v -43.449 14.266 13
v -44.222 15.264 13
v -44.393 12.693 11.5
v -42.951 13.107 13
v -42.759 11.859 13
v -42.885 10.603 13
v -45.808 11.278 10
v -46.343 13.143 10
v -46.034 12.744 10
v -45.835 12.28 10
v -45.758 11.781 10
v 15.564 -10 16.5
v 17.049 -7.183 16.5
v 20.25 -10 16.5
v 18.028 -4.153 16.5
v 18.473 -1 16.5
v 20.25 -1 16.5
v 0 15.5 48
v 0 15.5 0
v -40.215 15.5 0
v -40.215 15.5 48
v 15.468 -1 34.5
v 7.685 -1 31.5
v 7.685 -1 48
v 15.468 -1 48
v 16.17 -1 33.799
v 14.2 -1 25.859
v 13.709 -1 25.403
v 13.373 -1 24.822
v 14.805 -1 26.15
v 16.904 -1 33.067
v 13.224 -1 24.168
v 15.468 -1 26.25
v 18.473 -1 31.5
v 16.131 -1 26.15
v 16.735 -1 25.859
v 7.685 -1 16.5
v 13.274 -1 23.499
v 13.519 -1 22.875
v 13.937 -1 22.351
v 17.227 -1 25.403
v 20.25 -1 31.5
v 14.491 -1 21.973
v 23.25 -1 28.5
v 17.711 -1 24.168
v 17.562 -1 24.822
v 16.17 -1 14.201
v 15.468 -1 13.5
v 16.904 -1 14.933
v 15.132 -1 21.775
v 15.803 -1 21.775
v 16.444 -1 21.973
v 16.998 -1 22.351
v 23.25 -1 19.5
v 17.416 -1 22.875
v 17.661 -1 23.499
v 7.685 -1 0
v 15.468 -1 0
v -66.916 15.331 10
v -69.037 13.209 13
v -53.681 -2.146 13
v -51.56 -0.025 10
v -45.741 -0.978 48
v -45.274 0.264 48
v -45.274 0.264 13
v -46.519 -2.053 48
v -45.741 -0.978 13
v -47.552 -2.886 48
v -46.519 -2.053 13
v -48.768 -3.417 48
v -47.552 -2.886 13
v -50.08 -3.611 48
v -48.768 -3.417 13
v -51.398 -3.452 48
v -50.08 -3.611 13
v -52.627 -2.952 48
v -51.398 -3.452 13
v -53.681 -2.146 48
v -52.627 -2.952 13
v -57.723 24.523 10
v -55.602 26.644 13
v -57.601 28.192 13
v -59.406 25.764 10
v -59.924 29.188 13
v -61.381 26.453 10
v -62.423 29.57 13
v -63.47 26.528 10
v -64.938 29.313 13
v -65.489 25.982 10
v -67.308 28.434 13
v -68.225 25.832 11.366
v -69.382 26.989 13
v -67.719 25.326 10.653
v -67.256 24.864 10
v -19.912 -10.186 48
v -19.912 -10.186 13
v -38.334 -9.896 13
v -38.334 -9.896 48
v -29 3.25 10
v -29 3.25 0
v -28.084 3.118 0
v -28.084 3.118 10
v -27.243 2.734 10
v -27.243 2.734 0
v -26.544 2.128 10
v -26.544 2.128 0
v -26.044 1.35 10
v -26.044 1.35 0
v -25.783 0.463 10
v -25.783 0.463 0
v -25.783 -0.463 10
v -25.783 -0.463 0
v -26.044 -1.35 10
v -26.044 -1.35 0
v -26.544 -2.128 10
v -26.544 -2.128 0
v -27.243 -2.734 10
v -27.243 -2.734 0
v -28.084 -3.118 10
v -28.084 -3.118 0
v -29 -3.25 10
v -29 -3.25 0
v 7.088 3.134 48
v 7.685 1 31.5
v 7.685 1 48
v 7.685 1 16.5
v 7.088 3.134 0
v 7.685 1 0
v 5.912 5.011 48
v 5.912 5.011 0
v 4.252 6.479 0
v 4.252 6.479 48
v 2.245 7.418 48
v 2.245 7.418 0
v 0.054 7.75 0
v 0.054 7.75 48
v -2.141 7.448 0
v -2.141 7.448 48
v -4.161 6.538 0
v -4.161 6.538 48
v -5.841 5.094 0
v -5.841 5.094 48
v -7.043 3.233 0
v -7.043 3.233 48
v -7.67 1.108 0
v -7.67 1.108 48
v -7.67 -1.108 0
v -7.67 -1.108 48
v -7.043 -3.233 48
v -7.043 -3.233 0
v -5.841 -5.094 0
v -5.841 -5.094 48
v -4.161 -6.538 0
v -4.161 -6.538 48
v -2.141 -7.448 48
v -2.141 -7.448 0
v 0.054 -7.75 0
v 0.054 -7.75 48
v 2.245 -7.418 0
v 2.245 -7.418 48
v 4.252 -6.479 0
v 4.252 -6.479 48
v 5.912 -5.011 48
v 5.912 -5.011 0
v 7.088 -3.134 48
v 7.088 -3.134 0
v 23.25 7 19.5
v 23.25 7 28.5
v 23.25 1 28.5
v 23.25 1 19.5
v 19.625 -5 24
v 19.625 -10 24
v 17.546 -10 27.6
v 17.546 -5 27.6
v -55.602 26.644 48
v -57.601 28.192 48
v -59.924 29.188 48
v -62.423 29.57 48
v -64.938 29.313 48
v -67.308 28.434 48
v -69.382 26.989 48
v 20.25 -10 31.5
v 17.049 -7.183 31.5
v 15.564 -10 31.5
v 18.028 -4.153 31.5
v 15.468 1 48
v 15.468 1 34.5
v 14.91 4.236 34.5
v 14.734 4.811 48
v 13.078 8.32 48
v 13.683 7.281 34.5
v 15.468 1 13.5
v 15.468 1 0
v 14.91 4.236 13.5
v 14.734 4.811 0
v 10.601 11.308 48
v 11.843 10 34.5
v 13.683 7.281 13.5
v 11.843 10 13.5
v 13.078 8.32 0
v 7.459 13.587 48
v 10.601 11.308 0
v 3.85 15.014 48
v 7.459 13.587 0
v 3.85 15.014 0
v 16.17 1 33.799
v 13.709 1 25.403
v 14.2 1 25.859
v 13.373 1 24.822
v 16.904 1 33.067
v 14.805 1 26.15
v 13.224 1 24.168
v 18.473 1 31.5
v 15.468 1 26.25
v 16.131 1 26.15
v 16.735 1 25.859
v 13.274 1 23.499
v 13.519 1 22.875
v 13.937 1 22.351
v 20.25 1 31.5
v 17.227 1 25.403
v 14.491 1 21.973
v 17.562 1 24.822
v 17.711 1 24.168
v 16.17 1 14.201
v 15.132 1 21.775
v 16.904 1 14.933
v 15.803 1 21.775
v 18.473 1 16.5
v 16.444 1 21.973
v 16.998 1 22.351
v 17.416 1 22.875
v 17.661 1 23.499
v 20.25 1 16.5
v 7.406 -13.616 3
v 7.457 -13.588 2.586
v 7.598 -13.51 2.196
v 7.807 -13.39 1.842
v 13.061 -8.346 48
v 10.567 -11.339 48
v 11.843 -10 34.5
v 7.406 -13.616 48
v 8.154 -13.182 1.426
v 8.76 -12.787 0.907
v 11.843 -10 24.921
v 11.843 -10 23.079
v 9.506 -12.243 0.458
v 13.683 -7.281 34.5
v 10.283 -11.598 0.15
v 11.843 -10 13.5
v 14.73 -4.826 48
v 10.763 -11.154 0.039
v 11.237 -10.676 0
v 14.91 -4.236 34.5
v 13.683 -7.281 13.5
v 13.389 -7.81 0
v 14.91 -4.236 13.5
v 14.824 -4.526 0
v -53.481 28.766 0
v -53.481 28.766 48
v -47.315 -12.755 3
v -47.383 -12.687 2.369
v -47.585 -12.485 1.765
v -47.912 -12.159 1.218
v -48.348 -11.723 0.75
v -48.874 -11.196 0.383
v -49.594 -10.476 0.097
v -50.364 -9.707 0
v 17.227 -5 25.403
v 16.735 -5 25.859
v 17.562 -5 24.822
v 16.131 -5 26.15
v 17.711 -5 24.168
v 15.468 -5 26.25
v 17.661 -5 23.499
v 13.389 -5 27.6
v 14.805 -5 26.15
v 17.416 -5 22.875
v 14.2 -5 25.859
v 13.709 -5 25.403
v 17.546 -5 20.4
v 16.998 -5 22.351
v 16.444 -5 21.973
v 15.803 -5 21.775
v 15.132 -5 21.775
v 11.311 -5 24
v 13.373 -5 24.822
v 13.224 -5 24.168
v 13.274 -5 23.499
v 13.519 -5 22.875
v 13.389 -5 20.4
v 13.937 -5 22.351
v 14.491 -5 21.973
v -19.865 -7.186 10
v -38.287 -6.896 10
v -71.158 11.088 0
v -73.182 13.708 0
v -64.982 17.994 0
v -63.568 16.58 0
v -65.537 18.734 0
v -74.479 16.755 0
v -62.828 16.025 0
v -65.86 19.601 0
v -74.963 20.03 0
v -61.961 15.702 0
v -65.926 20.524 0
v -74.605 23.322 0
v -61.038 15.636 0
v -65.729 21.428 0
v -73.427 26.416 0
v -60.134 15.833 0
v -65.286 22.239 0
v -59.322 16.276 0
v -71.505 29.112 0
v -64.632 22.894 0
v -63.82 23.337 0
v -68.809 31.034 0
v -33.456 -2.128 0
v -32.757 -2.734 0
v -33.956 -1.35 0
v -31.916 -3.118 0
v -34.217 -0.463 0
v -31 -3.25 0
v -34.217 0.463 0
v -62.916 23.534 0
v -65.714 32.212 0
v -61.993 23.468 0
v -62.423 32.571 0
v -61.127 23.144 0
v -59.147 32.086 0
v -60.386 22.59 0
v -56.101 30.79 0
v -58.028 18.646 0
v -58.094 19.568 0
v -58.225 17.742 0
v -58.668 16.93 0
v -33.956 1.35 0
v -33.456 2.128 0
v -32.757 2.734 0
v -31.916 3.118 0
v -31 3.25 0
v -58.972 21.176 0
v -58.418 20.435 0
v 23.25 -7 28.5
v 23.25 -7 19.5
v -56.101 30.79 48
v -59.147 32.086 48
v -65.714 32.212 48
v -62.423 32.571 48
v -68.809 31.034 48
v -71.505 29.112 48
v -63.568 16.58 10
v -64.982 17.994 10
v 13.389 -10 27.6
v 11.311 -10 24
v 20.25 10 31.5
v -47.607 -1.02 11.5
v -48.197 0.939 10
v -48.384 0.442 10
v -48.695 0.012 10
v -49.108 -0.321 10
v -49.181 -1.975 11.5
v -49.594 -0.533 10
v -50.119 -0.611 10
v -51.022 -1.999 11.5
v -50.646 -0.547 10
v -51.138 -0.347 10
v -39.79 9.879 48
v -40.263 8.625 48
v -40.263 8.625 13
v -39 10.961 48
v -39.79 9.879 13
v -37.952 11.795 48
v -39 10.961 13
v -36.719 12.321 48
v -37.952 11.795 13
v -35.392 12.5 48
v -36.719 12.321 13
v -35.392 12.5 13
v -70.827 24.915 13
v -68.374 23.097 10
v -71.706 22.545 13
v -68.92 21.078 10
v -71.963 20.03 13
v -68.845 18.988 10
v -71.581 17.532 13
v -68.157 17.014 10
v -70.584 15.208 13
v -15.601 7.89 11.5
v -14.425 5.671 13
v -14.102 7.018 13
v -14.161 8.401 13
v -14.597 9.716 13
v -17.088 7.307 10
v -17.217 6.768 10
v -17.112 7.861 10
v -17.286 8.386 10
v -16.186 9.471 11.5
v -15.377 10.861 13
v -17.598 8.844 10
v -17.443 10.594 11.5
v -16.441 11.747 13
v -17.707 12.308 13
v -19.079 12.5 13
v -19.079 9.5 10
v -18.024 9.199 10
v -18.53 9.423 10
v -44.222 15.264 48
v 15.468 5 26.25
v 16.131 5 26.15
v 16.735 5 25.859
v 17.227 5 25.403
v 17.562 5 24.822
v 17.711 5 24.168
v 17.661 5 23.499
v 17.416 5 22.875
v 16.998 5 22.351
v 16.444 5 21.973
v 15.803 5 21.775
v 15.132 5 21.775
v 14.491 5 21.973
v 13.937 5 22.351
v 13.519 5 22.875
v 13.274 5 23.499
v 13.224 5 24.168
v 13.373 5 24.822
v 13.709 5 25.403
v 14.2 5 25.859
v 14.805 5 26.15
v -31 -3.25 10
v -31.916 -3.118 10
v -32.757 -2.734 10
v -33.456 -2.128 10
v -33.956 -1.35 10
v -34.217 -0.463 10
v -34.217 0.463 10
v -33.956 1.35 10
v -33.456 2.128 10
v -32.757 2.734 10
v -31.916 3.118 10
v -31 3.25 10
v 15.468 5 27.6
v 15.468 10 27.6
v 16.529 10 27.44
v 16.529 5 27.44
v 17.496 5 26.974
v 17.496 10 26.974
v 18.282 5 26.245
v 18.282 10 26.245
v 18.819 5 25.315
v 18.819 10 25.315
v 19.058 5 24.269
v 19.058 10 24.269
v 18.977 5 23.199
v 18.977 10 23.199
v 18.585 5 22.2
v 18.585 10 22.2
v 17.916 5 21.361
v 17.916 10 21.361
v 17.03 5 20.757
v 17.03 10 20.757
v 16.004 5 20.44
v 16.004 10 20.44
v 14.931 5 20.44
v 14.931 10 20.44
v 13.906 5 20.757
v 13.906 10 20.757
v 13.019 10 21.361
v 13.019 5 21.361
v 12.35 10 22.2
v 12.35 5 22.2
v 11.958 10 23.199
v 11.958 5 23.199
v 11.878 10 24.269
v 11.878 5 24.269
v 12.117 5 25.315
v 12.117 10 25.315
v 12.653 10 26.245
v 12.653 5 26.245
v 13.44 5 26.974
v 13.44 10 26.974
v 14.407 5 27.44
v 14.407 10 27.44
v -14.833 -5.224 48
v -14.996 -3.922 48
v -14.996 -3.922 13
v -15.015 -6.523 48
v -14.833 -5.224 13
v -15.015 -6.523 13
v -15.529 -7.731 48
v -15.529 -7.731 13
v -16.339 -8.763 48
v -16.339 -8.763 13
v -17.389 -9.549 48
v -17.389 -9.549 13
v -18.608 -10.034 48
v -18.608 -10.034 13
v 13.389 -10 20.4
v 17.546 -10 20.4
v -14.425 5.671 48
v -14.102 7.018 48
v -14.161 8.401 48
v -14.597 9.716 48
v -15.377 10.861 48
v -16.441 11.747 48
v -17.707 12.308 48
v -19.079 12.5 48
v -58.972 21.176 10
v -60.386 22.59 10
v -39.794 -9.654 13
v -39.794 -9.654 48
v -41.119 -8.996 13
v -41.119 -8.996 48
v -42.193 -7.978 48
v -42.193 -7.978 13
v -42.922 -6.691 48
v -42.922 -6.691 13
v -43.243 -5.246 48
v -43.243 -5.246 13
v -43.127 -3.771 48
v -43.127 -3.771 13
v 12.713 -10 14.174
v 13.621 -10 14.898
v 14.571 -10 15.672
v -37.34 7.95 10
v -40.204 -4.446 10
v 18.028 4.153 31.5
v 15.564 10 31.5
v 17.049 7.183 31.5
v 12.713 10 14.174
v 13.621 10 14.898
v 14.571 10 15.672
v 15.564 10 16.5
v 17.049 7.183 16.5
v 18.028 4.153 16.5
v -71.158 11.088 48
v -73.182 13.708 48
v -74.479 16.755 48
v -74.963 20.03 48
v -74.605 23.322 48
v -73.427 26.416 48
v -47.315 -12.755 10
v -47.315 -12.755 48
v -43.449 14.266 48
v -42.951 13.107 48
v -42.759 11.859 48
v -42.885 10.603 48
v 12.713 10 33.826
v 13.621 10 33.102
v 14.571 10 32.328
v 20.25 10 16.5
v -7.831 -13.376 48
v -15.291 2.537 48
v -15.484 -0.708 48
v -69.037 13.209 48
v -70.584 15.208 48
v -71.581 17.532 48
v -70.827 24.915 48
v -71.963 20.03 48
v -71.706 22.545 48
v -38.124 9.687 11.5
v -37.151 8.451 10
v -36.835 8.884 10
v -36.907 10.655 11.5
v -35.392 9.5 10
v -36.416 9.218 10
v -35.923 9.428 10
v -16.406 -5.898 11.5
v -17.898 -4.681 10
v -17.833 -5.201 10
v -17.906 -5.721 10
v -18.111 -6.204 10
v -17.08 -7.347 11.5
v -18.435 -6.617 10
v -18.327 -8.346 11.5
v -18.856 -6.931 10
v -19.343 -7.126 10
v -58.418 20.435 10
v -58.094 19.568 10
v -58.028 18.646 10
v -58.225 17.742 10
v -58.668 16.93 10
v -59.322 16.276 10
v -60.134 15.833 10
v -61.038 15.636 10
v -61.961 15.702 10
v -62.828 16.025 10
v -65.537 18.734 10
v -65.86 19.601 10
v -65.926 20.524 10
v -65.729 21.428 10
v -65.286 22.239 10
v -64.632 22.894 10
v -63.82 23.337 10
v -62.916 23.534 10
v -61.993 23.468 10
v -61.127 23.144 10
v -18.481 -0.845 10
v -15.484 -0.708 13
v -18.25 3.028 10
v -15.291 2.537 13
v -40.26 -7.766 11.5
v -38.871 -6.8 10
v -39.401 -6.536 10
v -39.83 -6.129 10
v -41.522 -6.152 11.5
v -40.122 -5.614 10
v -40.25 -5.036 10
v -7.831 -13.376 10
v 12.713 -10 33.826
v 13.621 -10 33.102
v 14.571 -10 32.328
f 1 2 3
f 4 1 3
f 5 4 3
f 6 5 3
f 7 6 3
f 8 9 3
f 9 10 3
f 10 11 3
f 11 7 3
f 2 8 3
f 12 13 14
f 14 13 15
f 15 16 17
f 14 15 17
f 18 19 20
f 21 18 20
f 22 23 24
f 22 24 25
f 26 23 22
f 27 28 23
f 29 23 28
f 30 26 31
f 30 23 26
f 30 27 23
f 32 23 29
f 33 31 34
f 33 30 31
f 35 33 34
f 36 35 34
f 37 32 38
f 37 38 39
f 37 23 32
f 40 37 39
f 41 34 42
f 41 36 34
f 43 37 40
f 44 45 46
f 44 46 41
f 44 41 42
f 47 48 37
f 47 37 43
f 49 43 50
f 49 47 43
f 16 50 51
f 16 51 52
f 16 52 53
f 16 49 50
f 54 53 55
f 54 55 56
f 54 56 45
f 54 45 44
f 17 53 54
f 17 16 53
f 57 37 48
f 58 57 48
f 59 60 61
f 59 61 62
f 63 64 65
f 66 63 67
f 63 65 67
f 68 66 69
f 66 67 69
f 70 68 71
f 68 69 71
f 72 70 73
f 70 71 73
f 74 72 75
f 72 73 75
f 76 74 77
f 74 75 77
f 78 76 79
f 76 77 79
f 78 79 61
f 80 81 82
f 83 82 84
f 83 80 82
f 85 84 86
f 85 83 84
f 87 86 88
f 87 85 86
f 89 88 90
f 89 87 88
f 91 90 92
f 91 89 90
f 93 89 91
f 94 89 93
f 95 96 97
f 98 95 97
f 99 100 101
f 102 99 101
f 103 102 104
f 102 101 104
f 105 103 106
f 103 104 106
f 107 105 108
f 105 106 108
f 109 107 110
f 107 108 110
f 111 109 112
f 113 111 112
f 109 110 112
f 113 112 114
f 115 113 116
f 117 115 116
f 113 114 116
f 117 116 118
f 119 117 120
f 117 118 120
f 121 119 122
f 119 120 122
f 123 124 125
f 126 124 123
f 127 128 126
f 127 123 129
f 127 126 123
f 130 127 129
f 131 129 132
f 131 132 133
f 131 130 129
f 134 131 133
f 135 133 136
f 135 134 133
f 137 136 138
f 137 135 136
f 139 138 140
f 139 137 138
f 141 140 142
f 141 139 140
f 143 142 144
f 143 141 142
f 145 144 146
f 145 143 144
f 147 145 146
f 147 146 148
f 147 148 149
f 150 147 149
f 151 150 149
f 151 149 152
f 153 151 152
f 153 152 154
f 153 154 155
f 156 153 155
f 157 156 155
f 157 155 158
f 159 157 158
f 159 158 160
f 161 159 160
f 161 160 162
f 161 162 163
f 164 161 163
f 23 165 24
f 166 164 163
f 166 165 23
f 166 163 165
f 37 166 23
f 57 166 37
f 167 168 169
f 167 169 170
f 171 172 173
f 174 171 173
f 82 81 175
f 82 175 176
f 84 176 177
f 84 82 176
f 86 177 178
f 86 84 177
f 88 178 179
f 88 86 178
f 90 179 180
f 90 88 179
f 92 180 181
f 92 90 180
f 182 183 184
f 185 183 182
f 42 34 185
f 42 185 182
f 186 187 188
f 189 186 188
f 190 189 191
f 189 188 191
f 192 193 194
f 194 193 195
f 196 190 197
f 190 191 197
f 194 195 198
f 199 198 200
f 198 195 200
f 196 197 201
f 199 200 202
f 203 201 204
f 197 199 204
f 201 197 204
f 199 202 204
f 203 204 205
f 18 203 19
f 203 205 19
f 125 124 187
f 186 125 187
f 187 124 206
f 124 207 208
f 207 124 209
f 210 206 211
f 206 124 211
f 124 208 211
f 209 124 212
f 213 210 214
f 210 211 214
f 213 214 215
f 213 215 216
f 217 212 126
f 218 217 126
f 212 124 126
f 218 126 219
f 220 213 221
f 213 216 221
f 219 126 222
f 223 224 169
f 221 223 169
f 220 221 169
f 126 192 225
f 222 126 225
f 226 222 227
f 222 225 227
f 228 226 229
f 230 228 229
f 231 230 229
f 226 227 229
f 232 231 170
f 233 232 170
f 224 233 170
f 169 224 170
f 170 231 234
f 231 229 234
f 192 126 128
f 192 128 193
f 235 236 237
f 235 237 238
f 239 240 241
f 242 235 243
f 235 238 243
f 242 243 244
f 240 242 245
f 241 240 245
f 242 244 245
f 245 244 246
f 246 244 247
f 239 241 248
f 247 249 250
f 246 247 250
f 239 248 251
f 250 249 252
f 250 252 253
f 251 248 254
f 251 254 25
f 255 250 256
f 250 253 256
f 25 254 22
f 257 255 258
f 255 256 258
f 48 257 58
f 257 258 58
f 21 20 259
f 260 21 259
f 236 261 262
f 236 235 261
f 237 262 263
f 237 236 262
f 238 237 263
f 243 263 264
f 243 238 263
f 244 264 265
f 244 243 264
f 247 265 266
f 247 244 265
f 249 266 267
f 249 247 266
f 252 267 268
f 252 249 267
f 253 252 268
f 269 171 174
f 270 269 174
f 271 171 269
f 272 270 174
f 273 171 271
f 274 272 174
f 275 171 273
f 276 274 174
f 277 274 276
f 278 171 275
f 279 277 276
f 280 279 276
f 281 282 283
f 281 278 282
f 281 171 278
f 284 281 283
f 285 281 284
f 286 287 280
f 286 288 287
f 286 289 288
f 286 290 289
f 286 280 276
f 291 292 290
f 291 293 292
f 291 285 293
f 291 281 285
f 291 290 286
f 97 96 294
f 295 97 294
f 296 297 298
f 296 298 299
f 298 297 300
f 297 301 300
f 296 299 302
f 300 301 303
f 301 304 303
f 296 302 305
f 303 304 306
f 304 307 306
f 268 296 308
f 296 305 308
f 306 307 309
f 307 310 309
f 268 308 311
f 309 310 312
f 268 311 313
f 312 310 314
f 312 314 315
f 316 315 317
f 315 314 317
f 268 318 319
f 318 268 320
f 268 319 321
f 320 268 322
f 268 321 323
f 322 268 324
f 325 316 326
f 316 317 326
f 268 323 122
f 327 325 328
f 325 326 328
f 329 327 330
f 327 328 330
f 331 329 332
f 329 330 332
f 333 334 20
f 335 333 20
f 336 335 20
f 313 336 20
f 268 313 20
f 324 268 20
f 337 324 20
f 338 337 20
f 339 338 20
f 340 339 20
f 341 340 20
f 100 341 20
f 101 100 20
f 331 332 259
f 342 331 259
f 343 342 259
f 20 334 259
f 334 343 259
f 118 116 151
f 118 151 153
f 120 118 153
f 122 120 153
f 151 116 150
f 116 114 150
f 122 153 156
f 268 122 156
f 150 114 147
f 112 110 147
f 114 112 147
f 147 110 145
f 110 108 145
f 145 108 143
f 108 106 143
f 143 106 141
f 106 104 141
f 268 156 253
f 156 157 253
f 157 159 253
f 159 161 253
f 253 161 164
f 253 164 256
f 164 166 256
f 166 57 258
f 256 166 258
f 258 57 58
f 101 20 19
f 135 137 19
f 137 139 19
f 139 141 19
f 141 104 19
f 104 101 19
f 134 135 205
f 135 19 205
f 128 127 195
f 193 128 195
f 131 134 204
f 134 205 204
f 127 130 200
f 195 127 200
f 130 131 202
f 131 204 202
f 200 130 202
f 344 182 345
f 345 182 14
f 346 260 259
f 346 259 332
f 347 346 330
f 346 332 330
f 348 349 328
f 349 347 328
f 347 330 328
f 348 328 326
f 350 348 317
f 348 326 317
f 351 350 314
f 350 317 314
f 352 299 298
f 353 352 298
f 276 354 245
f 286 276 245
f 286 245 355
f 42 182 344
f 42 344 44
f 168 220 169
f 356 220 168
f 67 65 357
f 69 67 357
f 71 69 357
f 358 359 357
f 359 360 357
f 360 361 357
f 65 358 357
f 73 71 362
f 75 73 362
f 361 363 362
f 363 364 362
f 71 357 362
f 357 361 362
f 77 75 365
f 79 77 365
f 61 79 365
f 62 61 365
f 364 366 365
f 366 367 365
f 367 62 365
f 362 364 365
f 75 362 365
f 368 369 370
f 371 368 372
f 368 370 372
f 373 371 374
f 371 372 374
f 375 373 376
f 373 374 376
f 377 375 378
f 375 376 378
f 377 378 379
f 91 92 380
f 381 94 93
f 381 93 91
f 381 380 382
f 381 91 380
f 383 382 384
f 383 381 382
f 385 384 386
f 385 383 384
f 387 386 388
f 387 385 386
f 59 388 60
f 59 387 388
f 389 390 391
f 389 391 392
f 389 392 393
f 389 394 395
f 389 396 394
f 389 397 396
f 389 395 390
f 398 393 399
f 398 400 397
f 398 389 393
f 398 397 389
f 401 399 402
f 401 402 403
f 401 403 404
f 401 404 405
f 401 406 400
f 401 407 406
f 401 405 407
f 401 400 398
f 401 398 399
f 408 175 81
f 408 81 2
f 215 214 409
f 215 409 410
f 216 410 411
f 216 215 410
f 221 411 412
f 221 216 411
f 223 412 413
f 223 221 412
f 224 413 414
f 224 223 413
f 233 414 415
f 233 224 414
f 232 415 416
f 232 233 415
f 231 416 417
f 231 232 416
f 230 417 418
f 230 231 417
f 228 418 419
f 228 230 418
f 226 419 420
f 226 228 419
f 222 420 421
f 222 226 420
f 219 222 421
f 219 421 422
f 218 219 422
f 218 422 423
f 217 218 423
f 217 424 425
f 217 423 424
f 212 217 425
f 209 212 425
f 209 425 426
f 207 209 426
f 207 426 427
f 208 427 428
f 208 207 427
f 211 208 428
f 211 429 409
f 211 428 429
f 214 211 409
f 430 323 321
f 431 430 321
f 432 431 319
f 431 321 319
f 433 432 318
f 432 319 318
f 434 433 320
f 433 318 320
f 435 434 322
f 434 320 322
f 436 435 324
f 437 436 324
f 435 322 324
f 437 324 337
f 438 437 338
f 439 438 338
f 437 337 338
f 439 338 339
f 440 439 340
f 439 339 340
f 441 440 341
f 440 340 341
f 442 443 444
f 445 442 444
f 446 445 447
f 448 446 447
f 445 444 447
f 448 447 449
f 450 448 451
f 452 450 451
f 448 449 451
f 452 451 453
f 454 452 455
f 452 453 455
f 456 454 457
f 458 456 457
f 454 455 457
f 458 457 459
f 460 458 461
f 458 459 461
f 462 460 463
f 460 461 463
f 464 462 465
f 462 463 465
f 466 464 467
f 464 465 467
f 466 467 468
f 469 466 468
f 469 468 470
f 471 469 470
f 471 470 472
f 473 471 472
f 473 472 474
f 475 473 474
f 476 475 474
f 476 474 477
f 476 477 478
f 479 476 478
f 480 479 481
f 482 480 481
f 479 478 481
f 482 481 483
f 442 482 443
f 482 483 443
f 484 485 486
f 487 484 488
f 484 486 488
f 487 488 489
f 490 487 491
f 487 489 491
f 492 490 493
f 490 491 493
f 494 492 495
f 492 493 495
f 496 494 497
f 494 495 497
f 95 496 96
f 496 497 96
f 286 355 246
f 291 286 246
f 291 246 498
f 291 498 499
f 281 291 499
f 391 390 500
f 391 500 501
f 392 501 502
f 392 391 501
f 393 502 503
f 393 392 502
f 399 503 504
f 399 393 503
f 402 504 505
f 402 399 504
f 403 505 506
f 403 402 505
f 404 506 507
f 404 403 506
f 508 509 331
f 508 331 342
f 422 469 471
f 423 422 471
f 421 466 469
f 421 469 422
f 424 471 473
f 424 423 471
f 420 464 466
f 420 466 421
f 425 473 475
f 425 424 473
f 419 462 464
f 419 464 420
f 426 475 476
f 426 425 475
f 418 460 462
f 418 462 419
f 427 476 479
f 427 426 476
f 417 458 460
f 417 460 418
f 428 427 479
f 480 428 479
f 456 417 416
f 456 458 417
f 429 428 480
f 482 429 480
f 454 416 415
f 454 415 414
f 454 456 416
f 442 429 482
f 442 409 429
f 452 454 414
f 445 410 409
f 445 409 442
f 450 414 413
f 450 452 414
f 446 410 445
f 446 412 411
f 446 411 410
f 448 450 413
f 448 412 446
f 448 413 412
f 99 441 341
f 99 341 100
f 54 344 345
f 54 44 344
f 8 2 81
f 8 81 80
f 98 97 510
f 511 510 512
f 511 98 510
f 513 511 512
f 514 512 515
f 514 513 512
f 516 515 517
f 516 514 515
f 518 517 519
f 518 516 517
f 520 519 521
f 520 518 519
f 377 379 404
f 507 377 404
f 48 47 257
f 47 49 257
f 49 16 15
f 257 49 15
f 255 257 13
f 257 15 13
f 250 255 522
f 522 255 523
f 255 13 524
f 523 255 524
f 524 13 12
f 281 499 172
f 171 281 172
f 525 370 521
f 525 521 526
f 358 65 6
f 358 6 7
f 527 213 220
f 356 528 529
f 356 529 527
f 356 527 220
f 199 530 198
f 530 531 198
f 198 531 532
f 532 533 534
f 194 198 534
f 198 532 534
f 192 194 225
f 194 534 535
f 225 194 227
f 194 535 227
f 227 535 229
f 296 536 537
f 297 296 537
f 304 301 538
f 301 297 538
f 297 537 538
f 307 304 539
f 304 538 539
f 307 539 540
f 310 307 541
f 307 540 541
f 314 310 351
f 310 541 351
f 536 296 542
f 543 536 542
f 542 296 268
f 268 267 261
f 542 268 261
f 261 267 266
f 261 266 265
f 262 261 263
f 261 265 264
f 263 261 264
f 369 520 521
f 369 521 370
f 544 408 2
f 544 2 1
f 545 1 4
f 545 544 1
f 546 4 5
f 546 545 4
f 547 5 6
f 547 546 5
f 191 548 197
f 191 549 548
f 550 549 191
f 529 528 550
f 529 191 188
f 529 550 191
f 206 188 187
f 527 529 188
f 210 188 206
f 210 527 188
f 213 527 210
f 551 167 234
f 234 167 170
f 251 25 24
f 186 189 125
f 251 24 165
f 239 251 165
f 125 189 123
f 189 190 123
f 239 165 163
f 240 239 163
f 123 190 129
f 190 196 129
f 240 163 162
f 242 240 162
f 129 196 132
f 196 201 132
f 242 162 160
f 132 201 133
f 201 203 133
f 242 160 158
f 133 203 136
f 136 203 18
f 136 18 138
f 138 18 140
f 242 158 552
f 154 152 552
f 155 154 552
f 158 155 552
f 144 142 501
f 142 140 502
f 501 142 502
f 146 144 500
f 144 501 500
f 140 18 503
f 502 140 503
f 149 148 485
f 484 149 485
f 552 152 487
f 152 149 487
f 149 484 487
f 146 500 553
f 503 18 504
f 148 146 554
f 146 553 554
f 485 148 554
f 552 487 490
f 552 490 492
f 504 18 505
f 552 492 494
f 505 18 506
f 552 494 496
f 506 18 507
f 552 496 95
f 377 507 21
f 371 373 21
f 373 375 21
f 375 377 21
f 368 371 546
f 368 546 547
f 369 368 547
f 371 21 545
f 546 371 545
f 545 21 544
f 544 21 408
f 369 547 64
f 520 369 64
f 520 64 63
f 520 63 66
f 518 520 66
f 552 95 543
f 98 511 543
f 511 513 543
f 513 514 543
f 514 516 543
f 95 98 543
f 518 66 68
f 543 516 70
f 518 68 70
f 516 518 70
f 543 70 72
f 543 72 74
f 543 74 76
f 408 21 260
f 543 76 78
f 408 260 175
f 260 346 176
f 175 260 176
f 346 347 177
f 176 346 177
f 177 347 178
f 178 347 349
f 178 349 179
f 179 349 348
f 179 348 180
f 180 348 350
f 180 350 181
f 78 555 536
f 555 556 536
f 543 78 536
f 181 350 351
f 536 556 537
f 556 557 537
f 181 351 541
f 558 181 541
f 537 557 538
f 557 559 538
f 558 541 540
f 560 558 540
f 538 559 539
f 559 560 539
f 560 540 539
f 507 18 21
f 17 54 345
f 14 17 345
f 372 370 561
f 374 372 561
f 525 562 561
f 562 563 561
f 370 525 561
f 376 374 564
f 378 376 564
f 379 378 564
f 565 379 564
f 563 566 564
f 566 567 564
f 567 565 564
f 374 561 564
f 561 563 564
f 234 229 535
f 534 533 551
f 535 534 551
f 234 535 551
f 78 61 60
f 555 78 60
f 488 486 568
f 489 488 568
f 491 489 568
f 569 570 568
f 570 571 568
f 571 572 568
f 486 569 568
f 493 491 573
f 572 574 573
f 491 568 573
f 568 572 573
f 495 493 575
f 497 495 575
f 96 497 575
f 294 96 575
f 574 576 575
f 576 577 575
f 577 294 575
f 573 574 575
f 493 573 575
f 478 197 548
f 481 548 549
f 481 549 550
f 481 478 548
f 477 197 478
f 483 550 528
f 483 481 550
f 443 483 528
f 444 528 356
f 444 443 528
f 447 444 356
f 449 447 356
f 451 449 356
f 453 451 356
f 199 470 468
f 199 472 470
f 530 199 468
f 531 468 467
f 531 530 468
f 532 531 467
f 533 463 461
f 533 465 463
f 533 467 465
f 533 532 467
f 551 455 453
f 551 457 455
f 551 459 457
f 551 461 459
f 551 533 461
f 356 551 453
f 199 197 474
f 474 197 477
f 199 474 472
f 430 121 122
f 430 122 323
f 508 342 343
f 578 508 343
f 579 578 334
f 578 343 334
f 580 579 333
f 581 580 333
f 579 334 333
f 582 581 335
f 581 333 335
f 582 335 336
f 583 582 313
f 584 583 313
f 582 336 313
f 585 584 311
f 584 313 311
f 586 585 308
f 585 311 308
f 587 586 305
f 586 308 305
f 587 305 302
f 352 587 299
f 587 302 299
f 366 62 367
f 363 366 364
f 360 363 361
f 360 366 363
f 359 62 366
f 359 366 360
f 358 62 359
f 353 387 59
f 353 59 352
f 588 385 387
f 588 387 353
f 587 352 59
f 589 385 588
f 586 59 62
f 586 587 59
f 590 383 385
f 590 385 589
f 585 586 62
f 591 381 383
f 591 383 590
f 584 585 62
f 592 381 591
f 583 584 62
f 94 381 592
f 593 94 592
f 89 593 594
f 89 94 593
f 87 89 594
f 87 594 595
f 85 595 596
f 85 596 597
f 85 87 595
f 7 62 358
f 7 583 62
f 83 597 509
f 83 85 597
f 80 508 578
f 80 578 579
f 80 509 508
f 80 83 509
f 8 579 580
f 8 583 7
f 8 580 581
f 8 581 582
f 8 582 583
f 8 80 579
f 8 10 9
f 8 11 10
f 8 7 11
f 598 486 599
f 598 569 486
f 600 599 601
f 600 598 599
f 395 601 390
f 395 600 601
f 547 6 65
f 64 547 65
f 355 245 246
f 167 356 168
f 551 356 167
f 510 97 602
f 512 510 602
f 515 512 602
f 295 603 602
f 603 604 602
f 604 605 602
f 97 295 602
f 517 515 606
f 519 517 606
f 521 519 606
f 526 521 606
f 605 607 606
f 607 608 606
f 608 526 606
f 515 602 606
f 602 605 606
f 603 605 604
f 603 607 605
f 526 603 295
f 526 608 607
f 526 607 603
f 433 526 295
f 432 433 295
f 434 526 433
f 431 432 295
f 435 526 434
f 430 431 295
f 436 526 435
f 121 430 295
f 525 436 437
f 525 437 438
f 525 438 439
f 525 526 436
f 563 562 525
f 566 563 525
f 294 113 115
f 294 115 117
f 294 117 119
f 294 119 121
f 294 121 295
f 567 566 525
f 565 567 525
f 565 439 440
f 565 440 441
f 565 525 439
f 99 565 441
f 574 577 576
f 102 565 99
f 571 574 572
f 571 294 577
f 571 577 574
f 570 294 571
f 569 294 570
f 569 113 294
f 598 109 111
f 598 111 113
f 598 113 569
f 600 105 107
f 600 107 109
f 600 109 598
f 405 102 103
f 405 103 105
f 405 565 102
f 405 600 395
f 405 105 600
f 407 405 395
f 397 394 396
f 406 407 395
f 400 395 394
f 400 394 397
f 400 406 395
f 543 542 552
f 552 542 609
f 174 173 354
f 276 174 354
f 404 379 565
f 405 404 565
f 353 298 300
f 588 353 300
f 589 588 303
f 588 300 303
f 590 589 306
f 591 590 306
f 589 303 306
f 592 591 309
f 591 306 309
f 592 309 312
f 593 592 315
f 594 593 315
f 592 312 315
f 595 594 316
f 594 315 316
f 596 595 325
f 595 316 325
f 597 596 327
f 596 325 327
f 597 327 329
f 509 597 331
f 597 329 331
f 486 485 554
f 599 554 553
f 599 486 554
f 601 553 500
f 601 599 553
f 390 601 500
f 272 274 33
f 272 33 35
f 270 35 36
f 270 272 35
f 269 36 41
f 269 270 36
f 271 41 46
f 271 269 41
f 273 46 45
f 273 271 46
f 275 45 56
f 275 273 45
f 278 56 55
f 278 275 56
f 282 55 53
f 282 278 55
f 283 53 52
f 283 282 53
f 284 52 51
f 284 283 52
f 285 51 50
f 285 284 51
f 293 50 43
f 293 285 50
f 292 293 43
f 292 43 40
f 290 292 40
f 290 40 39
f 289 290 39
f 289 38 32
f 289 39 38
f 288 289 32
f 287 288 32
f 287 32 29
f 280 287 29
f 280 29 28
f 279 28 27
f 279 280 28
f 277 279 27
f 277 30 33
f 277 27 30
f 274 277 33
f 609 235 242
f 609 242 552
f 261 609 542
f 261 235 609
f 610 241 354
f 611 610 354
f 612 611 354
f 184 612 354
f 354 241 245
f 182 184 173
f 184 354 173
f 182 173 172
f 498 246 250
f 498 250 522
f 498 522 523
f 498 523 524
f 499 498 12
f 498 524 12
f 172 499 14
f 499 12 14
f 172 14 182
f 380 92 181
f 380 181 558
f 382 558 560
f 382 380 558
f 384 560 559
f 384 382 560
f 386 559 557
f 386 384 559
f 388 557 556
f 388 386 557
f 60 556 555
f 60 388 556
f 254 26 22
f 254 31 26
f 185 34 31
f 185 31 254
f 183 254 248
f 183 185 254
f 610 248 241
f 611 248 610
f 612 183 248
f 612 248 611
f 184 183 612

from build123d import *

# Parameters (mm, degrees)
SKETCH1_R                    = 7.75
BOSS_EXTRUDE1_DEPTH          = 48
CUT_EXTRUDE1_START           = -38
CUT_EXTRUDE1_DEPTH           = 38
CUT_EXTRUDE2_DEPTH           = 2
CUT_EXTRUDE2_DEPTH_BACK      = 2
SKETCH17_W                   = 125.861359887
SKETCH17_H                   = 127.556512283
EXTRUDE_THIN1_DEPTH          = 38
FILLET1_R                    = 10
FILLET2_R                    = 13
EXTRUDE_THIN2_DEPTH          = 38
FILLET3_R                    = 5
CHAMFER1_SIZE                = 3
FILLET4_R                    = 3
SKETCH20_W                   = 15.564990448
SKETCH20_H                   = 15
BOSS_EXTRUDE3_DEPTH          = 10
CUT_EXTRUDE_THIN2_DEPTH      = 95.788643218
CUT_EXTRUDE_THIN2_DEPTH_BACK = 63
SKETCH15_W                   = 30.528675624
SKETCH15_H                   = 2
CUT_EXTRUDE3_DEPTH           = 96.136919394
CUT_EXTRUDE3_DEPTH_BACK      = 96.136919394
SKETCH21_R                   = 2.25
SKETCH22_R                   = 3.6
CUT_EXTRUDE4_DEPTH           = 5
CUT_EXTRUDE5_DEPTH           = 5
CHAMFER2_SIZE                = 3
CHAMFER3_SIZE                = 3


# Read off the part's stored shape, not the designer's step: Cut-Extrude1
with BuildPart() as part:
    # Sketch1 → Boss-Extrude1 (new body)
    with BuildSketch(Plane.XY):
        with BuildLine():
            Line((0, 15.5), (-30, 15.5))
            Line((-30, 15.5), (-40.214839435, 15.5))
            Line((-40.214839435, 15.5), (-62.672890113, 37.958050678))
            Line((-62.672890113, 37.958050678), (-80.350559642, 20.280381148))
            Line((-80.350559642, 20.280381148), (-45.035089247, -15.035089247))
            Line((-45.035089247, -15.035089247), (-29.535089247, -15.035089247))
            Line((-29.535089247, -15.035089247), (0, -15.5))
            ThreePointArc((0, -15.5), (10.960155108, -10.960155108), (15.5, 0))
            ThreePointArc((15.5, 0), (10.960155108, 10.960155108), (0, 15.5))
        make_face()
        Circle(SKETCH1_R, mode=Mode.SUBTRACT)
        with BuildLine():
            Line((-31, 3.25), (-29, 3.25))
            ThreePointArc((-29, 3.25), (-25.75, 0), (-29, -3.25))
            Line((-29, -3.25), (-31, -3.25))
            ThreePointArc((-31, -3.25), (-34.25, 0), (-31, 3.25))
        make_face(mode=Mode.SUBTRACT)
        with BuildLine():
            Line((-60.386222858, 22.589907971), (-58.972009295, 21.175694409))
            ThreePointArc((-58.972009295, 21.175694409), (-58.972009295, 16.579500331), (-63.568203373, 16.579500331))
            Line((-63.568203373, 16.579500331), (-64.982416935, 17.993713893))
            ThreePointArc((-64.982416935, 17.993713893), (-64.982416935, 22.589907971), (-60.386222858, 22.589907971))
        make_face(mode=Mode.SUBTRACT)
    extrude(amount=BOSS_EXTRUDE1_DEPTH)

    # Cut-Extrude1 outline → Cut-Extrude1 (cut)
    with BuildSketch(Plane.XY.offset(48).offset(CUT_EXTRUDE1_START)):
        with BuildLine():
            Line((-29.535089247, -15.035089247), (-0.487848981, -15.492320787))
            ThreePointArc((-0.487848981, -15.492320787), (-15.498080073, 0.243954708), (0, 15.5))
            Line((0, 15.5), (-40.214839435, 15.5))
            Line((-40.214839435, 15.5), (-62.672890113, 37.958050678))
            Line((-62.672890113, 37.958050678), (-80.350559642, 20.280381148))
            Line((-80.350559642, 20.280381148), (-45.035089247, -15.035089247))
            Line((-45.035089247, -15.035089247), (-29.535089247, -15.035089247))
        make_face()
        with BuildLine():
            Line((-29, -3.25), (-31, -3.25))
            ThreePointArc((-31, -3.25), (-34.25, 0), (-31, 3.25))
            Line((-31, 3.25), (-29, 3.25))
            ThreePointArc((-29, 3.25), (-25.75, 0), (-29, -3.25))
        make_face(mode=Mode.SUBTRACT)
        with BuildLine():
            Line((-63.568203373, 16.579500331), (-64.982416935, 17.993713893))
            ThreePointArc((-64.982416935, 17.993713893), (-64.982416935, 22.589907971), (-60.386222858, 22.589907971))
            Line((-60.386222858, 22.589907971), (-58.972009295, 21.175694409))
            ThreePointArc((-58.972009295, 21.175694409), (-58.972009295, 16.579500331), (-63.568203373, 16.579500331))
        make_face(mode=Mode.SUBTRACT)
    extrude(amount=CUT_EXTRUDE1_DEPTH, mode=Mode.SUBTRACT)

    # Sketch17 → Cut-Extrude2 (cut, two sides: drawn at the far end of the back side and taken through both)
    with BuildSketch(Plane(origin=(-0.243924491, -15.496160394, 0), x_dir=(-0.999876134056697, 0.015739013432683965, 0), z_dir=(-0.015739013432683965, -0.999876134056697, 0)).offset(-CUT_EXTRUDE2_DEPTH_BACK)):
        with Locations((29.523320042, -28.408716393)):
            Rectangle(SKETCH17_W, SKETCH17_H)
    extrude(amount=CUT_EXTRUDE2_DEPTH + CUT_EXTRUDE2_DEPTH_BACK, mode=Mode.SUBTRACT)

    # Sketch18 → Extrude-Thin1 (add)
    with BuildSketch(Plane.XY.offset(10)):
        Polygon((0, 15.5), (-40.214839435, 15.5), (-62.672890113, 37.958050678), (-80.350559642, 20.280381148), (-47.315213288, -12.754965206), (-7.830678136, -13.376489821), (-7.783461096, -10.376861419), (-46.053077004, -9.774460803), (-76.107918955, 20.280381148), (-62.672890113, 33.715409991), (-41.457480122, 12.5), (0, 12.5), align=None)
    extrude(amount=EXTRUDE_THIN1_DEPTH)

    # Fillet1
    # the kernel refuses this fillet: 10 mm, written as the material it adds along each edge
    with BuildSketch(Plane(origin=(-76.107918955, 20.280381148, 10), x_dir=(0.7071067811865474, 0.7071067811865477, 0), z_dir=(0, 0, 1)), Plane(origin=(-62.672890113, 33.715409991, 10), x_dir=(0.7071067811865476, -0.7071067811865476, 0), z_dir=(0, 0, 1))) as fillet1_piece_1:
        with BuildLine():
            CenterArc((FILLET1_R, -FILLET1_R), FILLET1_R, 90, 90)
            Line((0, -FILLET1_R), (0, 0))
            Line((0, 0), (FILLET1_R, 0))
        make_face()
    extrude(amount=38)

    # Fillet2
    # the kernel refuses this fillet: 13 mm, written as the material it takes off along each edge
    with BuildSketch(Plane(origin=(-80.350559642, 20.280381148, 80.5), x_dir=(0.7071067811865474, 0.7071067811865477, 0), z_dir=(0, 0, -1))) as fillet2_piece_1:
        with BuildLine():
            CenterArc((FILLET2_R, FILLET2_R), FILLET2_R, 180, 90)
            Line((0, FILLET2_R), (0, 0))
            Line((0, 0), (FILLET2_R, 0))
        make_face()
    extrude(amount=113, mode=Mode.SUBTRACT)
    with BuildSketch(Plane(origin=(-62.672890113, 37.958050678, -32.5), x_dir=(0.707106781186548, -0.7071067811865471, 0), z_dir=(0, 0, 1))) as fillet2_piece_2:
        with BuildLine():
            CenterArc((FILLET2_R, -FILLET2_R), FILLET2_R, 90, 90)
            Line((0, -FILLET2_R), (0, 0))
            Line((0, 0), (FILLET2_R, 0))
        make_face()
    extrude(amount=113, mode=Mode.SUBTRACT)

    # Sketch19 → Extrude-Thin2 (add)
    with BuildSketch(Plane.XY.offset(48)):
        Polygon((-41.676354362, 15.83760053), (-47.514591931, -9.436860273), (-44.591562077, -10.112061333), (-38.753324508, 15.16239947), align=None)
    extrude(amount=-EXTRUDE_THIN2_DEPTH)

    # Fillet3
    fillet3_edges = [part.edges().sort_by_distance(p)[0] for p in [
        (-9.165151385, 12.5, 29),
        (-11.56733894, -10.317299537, 29),
        (-47.303691572, -8.523846235, 29),
        (-44.51915596, -9.798606198, 29),
        (-39.368321628, 12.5, 29),
        (-42.261577308, 13.304097186, 29),
    ]]
    fillet(fillet3_edges, radius=FILLET3_R)

    # Chamfer1
    # the kernel refuses this chamfer: 3 mm, written as the material it adds along each edge
    with BuildSketch(Plane(origin=(-53.68106853, -2.146469277, 10), x_dir=(-0.019442520806014586, -0.01944252080601459, 0.9996219169112968), z_dir=(-0.7071067811865476, 0.7071067811865475, 0))) as chamfer1_piece_1:
        Polygon((CHAMFER1_SIZE * 0.999621916911, CHAMFER1_SIZE * 0.0274958766106), (-CHAMFER1_SIZE * 0.0274958766106, CHAMFER1_SIZE * 0.999621916911), (0, 0), align=None)
    extrude(amount=21.716356033)
    with BuildSketch(Plane(origin=(-62.672890113, 19.573274367, 10), x_dir=(0.7071067811865476, 0.7071067811865476, 0), z_dir=(0.7071067811865476, -0.7071067811865476, 0))) as chamfer1_piece_2:
        Polygon((10, CHAMFER1_SIZE), (10 - CHAMFER1_SIZE, 0), (10, 0), align=None)
    revolve(axis=Axis((-62.672890113, 19.573274367, 10), (0, 0, 1)), revolution_arc=131.354634341)
    with BuildSketch(Plane(origin=(-61.965783332, 20.280381148, 10), x_dir=(-0.06358071748062528, 0.9979766993094824, 0), z_dir=(0.9979766993094824, 0.06358071748062528, 0))) as chamfer1_piece_3:
        Polygon((10, CHAMFER1_SIZE), (10 - CHAMFER1_SIZE, 0), (10, 0), align=None)
    revolve(axis=Axis((-61.965783332, 20.280381148, 10), (0, 0, 1)), revolution_arc=131.354634341)
    with BuildSketch(Plane(origin=(-42.885448285, 10.603281677, 10), x_dir=(0.026790422734602474, -0.006188415005949584, 0.9996219169112968), z_dir=(-0.225067019815147, -0.9743432847777668, 0))) as chamfer1_piece_4:
        Polygon((CHAMFER1_SIZE * 0.999621916911, CHAMFER1_SIZE * 0.0274958766106), (-CHAMFER1_SIZE * 0.0274958766106, CHAMFER1_SIZE * 0.999621916911), (0, 0), align=None)
    extrude(amount=10.611816501)
    with BuildSketch(Plane(origin=(-55.601822301, 26.644342179, 10), x_dir=(0.01944252080601379, 0.019442520806013806, 0.9996219169112968), z_dir=(0.7071067811865479, -0.7071067811865472, 0))) as chamfer1_piece_5:
        Polygon((CHAMFER1_SIZE * 0.999621916911, CHAMFER1_SIZE * 0.0274958766106), (-CHAMFER1_SIZE * 0.0274958766106, CHAMFER1_SIZE * 0.999621916911), (0, 0), align=None)
    extrude(amount=16.094021158)
    with BuildSketch(Plane(origin=(-47.757164709, 11.728616776, 10), x_dir=(0.7071067811865476, 0.7071067811865476, 0), z_dir=(-0.7071067811865476, 0.7071067811865476, 0))) as chamfer1_piece_6:
        Polygon((5, -CHAMFER1_SIZE), (5 - CHAMFER1_SIZE, 0), (5, 0), align=None)
    revolve(axis=Axis((-47.757164709, 11.728616776, 10), (0, 0, -1)), revolution_arc=58.006819199)
    with BuildSketch(Plane(origin=(-50.145534624, 1.389064629, 10), x_dir=(0.9743432847777667, -0.22506701981514685, 0), z_dir=(0.22506701981514685, 0.9743432847777667, 0))) as chamfer1_piece_7:
        Polygon((5, -CHAMFER1_SIZE), (5 - CHAMFER1_SIZE, 0), (5, 0), align=None)
    revolve(axis=Axis((-50.145534624, 1.389064629, 10), (0, 0, -1)), revolution_arc=121.993180801)
    with BuildSketch(Plane(origin=(-19.911735458, -10.185950698, 10), x_dir=(-0.000432757971317445, -0.02749247080789303, 0.9996219169112968), z_dir=(-0.999876134056697, 0.015739013432684173, 0))) as chamfer1_piece_8:
        Polygon((CHAMFER1_SIZE * 0.999621916911, CHAMFER1_SIZE * 0.0274958766106), (-CHAMFER1_SIZE * 0.0274958766106, CHAMFER1_SIZE * 0.999621916911), (0, 0), align=None)
    extrude(amount=18.424401561)
    with BuildSketch(Plane(origin=(-43.12687622, -3.771253025, 10), x_dir=(-0.026790422734602474, 0.006188415005949584, 0.9996219169112968), z_dir=(0.225067019815147, 0.9743432847777668, 0))) as chamfer1_piece_9:
        Polygon((CHAMFER1_SIZE * 0.999621916911, CHAMFER1_SIZE * 0.0274958766106), (-CHAMFER1_SIZE * 0.0274958766106, CHAMFER1_SIZE * 0.999621916911), (0, 0), align=None)
    extrude(amount=12.723019)
    with BuildSketch(Plane(origin=(-35.391627827, 12.5, 10), x_dir=(0, 0.027495876610586206, 0.9996219169112968), z_dir=(1, 0, 0))) as chamfer1_piece_10:
        Polygon((CHAMFER1_SIZE * 0.999621916911, CHAMFER1_SIZE * 0.0274958766106), (-CHAMFER1_SIZE * 0.0274958766106, CHAMFER1_SIZE * 0.999621916911), (0, 0), align=None)
    extrude(amount=16.312843803)
    with BuildSketch(Plane(origin=(5e-09, 0, 10), x_dir=(-0.9674653851631903, -0.25300341600666165, 0), z_dir=(0.25300341600666165, -0.9674653851631903, 0))) as chamfer1_piece_11:
        Polygon((15.5, -CHAMFER1_SIZE), (15.5 + CHAMFER1_SIZE, 0), (15.5, 0), align=None)
    revolve(axis=Axis((5e-09, 0, 10), (0, 0, -1)), revolution_arc=36.115438071)
    with BuildSketch(Plane(origin=(-35.391627827, 7.5, 10), x_dir=(-0.9743432847777669, 0.22506701981514626, 0), z_dir=(-0.22506701981514626, -0.9743432847777669, 0))) as chamfer1_piece_12:
        Polygon((5, -CHAMFER1_SIZE), (5 - CHAMFER1_SIZE, 0), (5, 0), align=None)
    revolve(axis=Axis((-35.391627827, 7.5, 10), (0, 0, -1)), revolution_arc=76.993180801)
    with BuildSketch(Plane(origin=(-19.078784023, 7.5, 10), x_dir=(0.9306723916262207, -0.3658536585367573, 0), z_dir=(-0.3658536585367573, -0.9306723916262207, 0))) as chamfer1_piece_13:
        Polygon((5, CHAMFER1_SIZE), (5 - CHAMFER1_SIZE, 0), (5, 0), align=None)
    revolve(axis=Axis((-19.078784023, 7.5, 10), (0, 0, 1)), revolution_arc=111.460127749)
    with BuildSketch(Plane(origin=(-19.833040391, -5.186570028, 10), x_dir=(0.9674653851631903, 0.25300341600666165, 0), z_dir=(-0.25300341600666165, 0.9674653851631903, 0))) as chamfer1_piece_14:
        Polygon((5, -CHAMFER1_SIZE), (5 - CHAMFER1_SIZE, 0), (5, 0), align=None)
    revolve(axis=Axis((-19.833040391, -5.186570028, 10), (0, 0, -1)), revolution_arc=105.5571266)
    with BuildSketch(Plane(origin=(-38.255159796, -4.896588124, 10), x_dir=(-0.0157390134326846, -0.9998761340566968, 0), z_dir=(0.9998761340566968, -0.0157390134326846, 0))) as chamfer1_piece_15:
        Polygon((5, -CHAMFER1_SIZE), (5 - CHAMFER1_SIZE, 0), (5, 0), align=None)
    revolve(axis=Axis((-38.255159796, -4.896588124, 10), (0, 0, -1)), revolution_arc=102.105002921)

    # Fillet4
    fillet4_edges = [part.edges().sort_by_distance(p)[0] for p in [
        (-19.95471404, -13.185645818, 0),
    ]]
    fillet(fillet4_edges, radius=FILLET4_R)

    # Sketch20 → Boss-Extrude3 (add, symmetric)
    with BuildSketch(Plane(origin=(0, 0, 0), x_dir=(1, 0, 0), z_dir=(0, 1, 0))):
        with Locations((15.467708298, -24)):
            Rectangle(SKETCH20_W, SKETCH20_H)
    extrude(amount=BOSS_EXTRUDE3_DEPTH, both=True)

    # Sketch15 → Cut-Extrude-Thin2 (cut, two sides: drawn at the far end of the back side and taken through both)
    with BuildSketch(Plane.XY.offset(48).offset(-CUT_EXTRUDE_THIN2_DEPTH_BACK)):
        with Locations((15.264337812, 0)):
            Rectangle(SKETCH15_W, SKETCH15_H)
    extrude(amount=CUT_EXTRUDE_THIN2_DEPTH + CUT_EXTRUDE_THIN2_DEPTH_BACK, mode=Mode.SUBTRACT)

    # Sketch21 → Cut-Extrude3 (cut, two sides: drawn at the far end of the back side and taken through both)
    with BuildSketch(Plane(origin=(0, -1, 0), x_dir=(1, 0, 0), z_dir=(0, 1, 0)).offset(-CUT_EXTRUDE3_DEPTH_BACK)):
        with Locations(Location((15.467708298, -24, 0), (0, 0, 270))):
            Circle(SKETCH21_R)
    extrude(amount=CUT_EXTRUDE3_DEPTH + CUT_EXTRUDE3_DEPTH_BACK, mode=Mode.SUBTRACT)

    # Sketch22 → Cut-Extrude4 (cut)
    with BuildSketch(Plane(origin=(0, 10, 0), x_dir=(1, 0, 0), z_dir=(0, 1, 0))):
        with Locations(Location((15.467708298, -24, 0), (0, 0, 270))):
            Circle(SKETCH22_R)
    extrude(amount=-CUT_EXTRUDE4_DEPTH, mode=Mode.SUBTRACT)

    # Sketch23 → Cut-Extrude5 (cut)
    with BuildSketch(Plane(origin=(0, -10, 0), x_dir=(-1, 0, 0), z_dir=(0, -1, 0))):
        Polygon((-19.624630236, -24), (-17.546169267, -27.6), (-13.389247329, -27.6), (-11.31078636, -24), (-13.389247329, -20.4), (-17.546169267, -20.4), align=None)
    extrude(amount=-CUT_EXTRUDE5_DEPTH, mode=Mode.SUBTRACT)

    # Chamfer2
    chamfer2_edges = [part.edges().sort_by_distance(p)[0] for p in [
        (23.250203522, 10, 24),
        (14.377581982, 5.790952974, 31.5),
        (23.250203522, -10, 24),
        (14.377581982, -5.790952974, 16.5),
        (14.377581982, 5.790952974, 16.5),
        (14.377581982, -5.790952974, 31.5),
    ]]
    chamfer(chamfer2_edges, length=CHAMFER2_SIZE)

    # Chamfer3
    chamfer3_edges = [part.edges().sort_by_distance(p)[0] for p in [
        (23.250203522, -4, 16.5),
        (23.250203522, 4, 16.5),
        (23.250203522, -4, 31.5),
        (23.250203522, 4, 31.5),
    ]]
    chamfer(chamfer3_edges, length=CHAMFER3_SIZE)


solid = part.part
